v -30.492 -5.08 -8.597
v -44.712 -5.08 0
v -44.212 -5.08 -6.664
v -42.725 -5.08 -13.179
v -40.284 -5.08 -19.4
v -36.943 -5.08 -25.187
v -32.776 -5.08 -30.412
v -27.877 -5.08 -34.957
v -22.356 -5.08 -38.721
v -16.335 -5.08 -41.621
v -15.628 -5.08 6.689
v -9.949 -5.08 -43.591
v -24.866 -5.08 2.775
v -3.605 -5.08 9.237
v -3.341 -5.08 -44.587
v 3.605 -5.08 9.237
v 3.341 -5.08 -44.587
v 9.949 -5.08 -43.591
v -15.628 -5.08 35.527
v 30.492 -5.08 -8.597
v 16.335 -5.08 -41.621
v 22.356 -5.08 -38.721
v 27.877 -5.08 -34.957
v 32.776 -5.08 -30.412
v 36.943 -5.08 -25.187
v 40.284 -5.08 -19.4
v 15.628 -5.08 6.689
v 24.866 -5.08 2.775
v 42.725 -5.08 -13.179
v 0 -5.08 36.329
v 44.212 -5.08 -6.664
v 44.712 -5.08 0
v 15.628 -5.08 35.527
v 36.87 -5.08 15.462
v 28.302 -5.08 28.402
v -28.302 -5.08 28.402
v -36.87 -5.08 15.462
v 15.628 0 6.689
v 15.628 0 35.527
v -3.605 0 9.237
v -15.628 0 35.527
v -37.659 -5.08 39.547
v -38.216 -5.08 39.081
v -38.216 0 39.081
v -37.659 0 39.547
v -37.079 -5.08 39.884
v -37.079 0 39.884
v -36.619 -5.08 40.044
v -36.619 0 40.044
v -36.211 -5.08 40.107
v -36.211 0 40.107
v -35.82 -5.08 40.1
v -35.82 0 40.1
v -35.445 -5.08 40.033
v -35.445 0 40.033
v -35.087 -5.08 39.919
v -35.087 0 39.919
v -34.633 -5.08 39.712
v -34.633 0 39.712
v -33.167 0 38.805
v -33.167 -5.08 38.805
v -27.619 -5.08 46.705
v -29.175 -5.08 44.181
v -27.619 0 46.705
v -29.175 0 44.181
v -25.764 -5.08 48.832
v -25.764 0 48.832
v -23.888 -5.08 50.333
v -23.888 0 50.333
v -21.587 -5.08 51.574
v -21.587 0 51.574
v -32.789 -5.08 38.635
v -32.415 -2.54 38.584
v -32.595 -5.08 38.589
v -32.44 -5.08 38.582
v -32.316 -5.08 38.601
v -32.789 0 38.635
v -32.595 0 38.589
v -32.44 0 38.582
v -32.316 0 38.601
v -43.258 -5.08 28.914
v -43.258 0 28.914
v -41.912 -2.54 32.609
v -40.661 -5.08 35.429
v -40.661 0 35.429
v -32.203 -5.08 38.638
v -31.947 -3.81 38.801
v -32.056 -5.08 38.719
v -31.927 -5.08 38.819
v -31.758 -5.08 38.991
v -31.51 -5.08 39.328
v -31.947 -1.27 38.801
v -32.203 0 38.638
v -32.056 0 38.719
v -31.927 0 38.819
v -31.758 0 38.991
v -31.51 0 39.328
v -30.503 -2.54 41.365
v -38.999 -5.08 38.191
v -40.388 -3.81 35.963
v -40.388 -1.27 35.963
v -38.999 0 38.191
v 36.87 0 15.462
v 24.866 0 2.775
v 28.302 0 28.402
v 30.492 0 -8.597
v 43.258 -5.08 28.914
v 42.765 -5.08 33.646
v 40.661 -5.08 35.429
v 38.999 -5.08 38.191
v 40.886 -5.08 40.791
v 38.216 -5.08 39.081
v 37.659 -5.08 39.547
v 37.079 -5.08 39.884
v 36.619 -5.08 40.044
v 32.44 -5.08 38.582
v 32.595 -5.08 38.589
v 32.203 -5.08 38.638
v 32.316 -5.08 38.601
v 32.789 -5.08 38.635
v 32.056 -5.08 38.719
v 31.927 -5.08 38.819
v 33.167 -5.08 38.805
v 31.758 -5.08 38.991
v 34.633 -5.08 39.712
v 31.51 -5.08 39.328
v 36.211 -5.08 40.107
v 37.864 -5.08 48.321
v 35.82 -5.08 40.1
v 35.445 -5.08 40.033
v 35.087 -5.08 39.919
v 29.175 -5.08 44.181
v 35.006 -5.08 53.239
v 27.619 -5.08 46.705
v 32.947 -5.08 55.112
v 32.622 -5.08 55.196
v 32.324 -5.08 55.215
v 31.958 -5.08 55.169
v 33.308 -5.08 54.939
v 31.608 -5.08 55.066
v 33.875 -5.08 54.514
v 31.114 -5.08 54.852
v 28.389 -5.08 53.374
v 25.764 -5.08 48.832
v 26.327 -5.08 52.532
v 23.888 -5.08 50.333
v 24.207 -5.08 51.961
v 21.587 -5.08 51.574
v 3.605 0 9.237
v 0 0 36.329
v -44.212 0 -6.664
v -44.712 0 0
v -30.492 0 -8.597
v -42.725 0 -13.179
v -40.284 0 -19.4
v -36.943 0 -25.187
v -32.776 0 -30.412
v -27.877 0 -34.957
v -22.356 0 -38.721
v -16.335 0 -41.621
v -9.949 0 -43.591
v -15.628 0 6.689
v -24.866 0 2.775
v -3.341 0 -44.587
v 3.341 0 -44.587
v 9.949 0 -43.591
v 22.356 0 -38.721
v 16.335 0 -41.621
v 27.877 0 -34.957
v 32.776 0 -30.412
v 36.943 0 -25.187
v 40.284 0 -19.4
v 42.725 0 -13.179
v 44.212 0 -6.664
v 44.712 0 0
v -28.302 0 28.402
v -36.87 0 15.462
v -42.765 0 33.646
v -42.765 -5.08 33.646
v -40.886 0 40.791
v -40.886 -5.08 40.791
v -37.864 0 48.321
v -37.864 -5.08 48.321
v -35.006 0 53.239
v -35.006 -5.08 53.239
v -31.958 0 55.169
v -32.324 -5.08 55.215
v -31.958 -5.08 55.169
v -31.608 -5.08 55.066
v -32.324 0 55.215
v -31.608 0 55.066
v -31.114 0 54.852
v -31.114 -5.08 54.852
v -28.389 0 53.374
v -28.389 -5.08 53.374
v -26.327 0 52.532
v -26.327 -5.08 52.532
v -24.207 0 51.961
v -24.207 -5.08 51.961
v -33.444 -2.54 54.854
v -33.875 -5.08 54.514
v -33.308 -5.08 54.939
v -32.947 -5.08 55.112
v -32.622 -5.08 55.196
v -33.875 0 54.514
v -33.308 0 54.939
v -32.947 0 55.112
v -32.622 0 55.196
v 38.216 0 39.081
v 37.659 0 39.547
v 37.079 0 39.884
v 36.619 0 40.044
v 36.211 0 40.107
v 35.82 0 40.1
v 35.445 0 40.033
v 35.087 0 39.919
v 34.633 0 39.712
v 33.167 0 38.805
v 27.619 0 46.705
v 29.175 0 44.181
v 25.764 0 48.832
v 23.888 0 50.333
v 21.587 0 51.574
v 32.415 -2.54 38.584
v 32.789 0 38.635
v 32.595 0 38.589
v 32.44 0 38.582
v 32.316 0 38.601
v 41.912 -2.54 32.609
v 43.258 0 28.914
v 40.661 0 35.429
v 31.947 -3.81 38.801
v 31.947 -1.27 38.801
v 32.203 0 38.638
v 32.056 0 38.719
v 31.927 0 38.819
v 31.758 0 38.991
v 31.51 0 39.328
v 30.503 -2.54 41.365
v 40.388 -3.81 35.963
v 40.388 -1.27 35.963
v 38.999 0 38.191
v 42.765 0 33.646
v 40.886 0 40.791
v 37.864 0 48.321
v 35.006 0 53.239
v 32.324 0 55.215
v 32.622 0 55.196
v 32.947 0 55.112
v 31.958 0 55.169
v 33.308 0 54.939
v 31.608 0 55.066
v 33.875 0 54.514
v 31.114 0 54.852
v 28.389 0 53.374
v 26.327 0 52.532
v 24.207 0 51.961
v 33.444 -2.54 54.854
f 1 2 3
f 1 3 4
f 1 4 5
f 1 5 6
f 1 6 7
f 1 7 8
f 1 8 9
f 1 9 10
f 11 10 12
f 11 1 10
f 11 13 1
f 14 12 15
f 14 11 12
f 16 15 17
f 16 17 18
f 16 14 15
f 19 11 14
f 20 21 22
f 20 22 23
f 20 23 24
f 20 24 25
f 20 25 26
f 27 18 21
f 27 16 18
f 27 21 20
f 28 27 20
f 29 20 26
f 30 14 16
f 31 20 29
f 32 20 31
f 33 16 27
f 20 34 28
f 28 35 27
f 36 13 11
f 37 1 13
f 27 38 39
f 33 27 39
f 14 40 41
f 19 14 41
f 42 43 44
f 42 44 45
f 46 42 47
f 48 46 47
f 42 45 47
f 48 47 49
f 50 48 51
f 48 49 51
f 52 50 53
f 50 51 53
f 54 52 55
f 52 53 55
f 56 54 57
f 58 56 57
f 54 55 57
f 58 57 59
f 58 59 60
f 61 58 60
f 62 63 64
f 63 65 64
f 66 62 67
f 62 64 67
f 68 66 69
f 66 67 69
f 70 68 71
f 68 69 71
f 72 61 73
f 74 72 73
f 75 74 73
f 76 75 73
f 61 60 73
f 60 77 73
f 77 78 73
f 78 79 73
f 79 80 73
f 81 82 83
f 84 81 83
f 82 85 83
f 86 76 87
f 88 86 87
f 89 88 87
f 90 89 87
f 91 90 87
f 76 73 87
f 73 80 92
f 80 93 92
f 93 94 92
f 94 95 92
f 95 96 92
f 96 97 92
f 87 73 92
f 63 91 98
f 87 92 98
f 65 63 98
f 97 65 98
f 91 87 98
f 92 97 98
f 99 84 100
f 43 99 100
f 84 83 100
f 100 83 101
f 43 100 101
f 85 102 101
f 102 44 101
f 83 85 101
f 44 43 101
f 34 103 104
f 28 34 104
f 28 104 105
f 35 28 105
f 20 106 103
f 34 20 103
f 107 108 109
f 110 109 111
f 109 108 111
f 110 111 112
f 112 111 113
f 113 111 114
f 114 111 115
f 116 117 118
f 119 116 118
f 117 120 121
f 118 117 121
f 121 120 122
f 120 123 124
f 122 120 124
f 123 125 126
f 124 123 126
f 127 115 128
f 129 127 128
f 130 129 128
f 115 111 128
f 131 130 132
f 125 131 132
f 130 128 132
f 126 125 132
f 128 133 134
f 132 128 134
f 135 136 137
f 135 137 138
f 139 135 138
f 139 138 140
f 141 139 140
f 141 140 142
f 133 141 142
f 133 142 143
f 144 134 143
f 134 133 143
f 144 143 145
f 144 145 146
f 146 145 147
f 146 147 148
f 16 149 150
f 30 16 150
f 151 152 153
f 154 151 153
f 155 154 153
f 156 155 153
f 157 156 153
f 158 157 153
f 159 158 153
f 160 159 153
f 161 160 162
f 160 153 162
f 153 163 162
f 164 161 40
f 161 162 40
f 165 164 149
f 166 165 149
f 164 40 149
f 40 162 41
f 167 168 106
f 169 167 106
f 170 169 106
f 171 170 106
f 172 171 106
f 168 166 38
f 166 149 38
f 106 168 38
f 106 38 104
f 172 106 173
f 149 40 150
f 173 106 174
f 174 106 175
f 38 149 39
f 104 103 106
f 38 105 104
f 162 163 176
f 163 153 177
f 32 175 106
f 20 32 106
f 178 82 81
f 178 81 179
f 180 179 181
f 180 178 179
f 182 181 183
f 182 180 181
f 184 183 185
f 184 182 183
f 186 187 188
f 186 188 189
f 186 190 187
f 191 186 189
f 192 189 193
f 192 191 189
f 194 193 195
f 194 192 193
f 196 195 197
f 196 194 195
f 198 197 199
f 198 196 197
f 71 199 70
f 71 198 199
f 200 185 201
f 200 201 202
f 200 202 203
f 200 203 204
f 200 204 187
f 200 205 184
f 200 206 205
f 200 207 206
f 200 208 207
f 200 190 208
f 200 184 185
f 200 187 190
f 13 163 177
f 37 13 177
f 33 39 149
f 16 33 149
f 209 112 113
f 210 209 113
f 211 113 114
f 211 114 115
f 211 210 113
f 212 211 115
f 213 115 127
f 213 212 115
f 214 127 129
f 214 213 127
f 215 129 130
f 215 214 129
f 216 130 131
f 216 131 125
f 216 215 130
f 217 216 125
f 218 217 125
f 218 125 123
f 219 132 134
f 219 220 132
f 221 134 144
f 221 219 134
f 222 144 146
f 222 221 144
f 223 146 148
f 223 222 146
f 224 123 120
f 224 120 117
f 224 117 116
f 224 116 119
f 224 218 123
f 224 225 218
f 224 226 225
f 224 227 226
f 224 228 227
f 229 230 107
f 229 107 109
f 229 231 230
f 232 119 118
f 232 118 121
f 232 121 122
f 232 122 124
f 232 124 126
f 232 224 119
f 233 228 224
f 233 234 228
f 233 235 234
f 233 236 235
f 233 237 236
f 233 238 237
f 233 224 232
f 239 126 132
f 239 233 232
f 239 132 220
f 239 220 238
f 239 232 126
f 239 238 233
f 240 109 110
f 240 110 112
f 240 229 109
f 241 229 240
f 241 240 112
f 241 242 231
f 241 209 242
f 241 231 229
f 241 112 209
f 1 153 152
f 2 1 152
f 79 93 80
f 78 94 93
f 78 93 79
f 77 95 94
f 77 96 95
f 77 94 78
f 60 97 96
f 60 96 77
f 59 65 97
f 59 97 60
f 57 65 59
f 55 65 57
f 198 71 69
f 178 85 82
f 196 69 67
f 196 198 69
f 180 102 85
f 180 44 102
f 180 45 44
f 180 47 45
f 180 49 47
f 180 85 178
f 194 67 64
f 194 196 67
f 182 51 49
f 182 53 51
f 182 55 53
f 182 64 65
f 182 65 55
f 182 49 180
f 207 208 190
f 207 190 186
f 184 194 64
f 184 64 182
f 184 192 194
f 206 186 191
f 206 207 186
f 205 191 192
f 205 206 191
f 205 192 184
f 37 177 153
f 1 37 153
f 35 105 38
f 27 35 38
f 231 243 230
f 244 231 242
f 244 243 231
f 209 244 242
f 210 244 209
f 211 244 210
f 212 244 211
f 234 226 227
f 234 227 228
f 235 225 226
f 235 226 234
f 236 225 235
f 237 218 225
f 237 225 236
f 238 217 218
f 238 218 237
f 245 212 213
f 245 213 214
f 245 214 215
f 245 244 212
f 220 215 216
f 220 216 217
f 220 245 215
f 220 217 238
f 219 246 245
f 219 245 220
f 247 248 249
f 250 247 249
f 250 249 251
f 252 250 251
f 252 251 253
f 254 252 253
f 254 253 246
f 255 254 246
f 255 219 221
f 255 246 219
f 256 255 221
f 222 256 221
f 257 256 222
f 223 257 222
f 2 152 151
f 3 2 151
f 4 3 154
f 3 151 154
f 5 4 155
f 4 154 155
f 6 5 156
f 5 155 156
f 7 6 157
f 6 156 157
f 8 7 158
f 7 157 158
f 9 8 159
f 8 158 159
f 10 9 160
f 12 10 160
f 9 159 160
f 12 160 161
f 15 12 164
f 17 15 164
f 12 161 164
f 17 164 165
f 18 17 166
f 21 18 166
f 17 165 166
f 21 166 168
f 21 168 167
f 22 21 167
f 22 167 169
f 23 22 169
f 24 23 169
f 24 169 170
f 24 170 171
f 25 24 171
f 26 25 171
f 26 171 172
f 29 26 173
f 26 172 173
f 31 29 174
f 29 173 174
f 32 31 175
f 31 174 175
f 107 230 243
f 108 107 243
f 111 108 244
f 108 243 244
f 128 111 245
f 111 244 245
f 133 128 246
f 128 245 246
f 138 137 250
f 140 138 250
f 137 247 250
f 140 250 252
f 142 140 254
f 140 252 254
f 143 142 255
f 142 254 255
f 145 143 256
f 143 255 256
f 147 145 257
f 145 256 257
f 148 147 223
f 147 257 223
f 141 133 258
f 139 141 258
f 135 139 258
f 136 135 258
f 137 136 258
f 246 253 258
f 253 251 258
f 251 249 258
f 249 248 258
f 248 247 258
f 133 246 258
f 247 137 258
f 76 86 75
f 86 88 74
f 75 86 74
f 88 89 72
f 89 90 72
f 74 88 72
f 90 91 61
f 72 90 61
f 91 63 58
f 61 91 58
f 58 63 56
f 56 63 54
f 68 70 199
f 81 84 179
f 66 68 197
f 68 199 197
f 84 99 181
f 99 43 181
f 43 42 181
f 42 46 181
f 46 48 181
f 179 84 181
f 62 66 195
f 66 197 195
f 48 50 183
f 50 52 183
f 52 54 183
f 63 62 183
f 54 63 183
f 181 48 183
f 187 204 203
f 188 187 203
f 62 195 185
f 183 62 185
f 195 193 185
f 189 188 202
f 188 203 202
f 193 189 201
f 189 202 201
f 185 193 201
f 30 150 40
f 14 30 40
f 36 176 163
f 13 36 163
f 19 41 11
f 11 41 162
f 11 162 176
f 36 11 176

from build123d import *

# Parameters (mm, degrees)
F1_DEPTH = 5.08


with BuildPart() as f1:
    # F0 (on Front) → F1 (new body)
    with BuildSketch(Plane.XZ):
        with BuildLine():
            Line((-30.4917079704, -8.5969122879), (-44.7117361696, 0))
            ThreePointArc((-44.7117361696, 0), (0, -44.7117361696), (44.7117361696, 0))
            Line((44.7117361696, 0), (30.4917079704, -8.5969122879))
            Line((30.4917079704, -8.5969122879), (36.8702813996, 15.4620256321))
            Line((36.8702813996, 15.4620256321), (24.8657964922, 2.7749148631))
            Line((24.8657964922, 2.7749148631), (28.3017228247, 28.4015839336))
            Line((28.3017228247, 28.4015839336), (15.6278407007, 6.6893406487))
            Line((15.6278407007, 6.6893406487), (15.6278407007, 35.5272355899))
            Line((15.6278407007, 35.5272355899), (3.6053249558, 9.237256494))
            Line((3.6053249558, 9.237256494), (0, 36.3292721449))
            Line((0, 36.3292721449), (-3.6053249558, 9.237256494))
            Line((-3.6053249558, 9.237256494), (-15.6278407007, 35.5272355899))
            Line((-15.6278407007, 35.5272355899), (-15.6278407007, 6.6893406487))
            Line((-15.6278407007, 6.6893406487), (-28.3017228247, 28.4015839336))
            Line((-28.3017228247, 28.4015839336), (-24.8657964922, 2.7749148631))
            Line((-24.8657964922, 2.7749148631), (-36.8702813996, 15.4620256321))
            Line((-36.8702813996, 15.4620256321), (-30.4917079704, -8.5969122879))
        make_face()
    extrude(amount=F1_DEPTH)


with BuildPart() as f1b:
    # F0 (on Front) → F1, piece 2 (new body)
    with BuildSketch(Plane.XZ):
        with BuildLine():
            add(Edge.make_bspline(
                [(-43.2581901172, 28.9142417867), (-43.2581901172, 37.2790971041), (-32.8213132961, 62.5909789579), (-29.919565422, 52.343014737), (-21.5866644317, 51.5744184906)],
                knots=[0, 0, 0, 0, 0.6002335301, 1, 1, 1, 1], degree=3))
            add(Edge.make_bspline(
                [(-43.2581901172, 28.9142417867), (-37.5419406421, 45.9948715537), (-30.8065651402, 30.2143125781), (-29.919565422, 48.017363362), (-21.5866644317, 51.5744184906)],
                knots=[0, 0, 0, 0, 0.4810173452, 1, 1, 1, 1], degree=3))
        make_face()
    extrude(amount=F1_DEPTH)


with BuildPart() as f1c:
    # F0 (on Front) → F1, piece 3 (new body)
    with BuildSketch(Plane.XZ):
        with BuildLine():
            add(Edge.make_bspline(
                [(43.2581901172, 28.9142417867), (37.5419406421, 45.9948715537), (30.8065651402, 30.2143125781), (29.919565422, 48.017363362), (21.5866644317, 51.5744184906)],
                knots=[0, 0, 0, 0, 0.4810173452, 1, 1, 1, 1], degree=3))
            add(Edge.make_bspline(
                [(43.2581901172, 28.9142417867), (43.2581901172, 37.2790971041), (32.8213132961, 62.5909789579), (29.919565422, 52.343014737), (21.5866644317, 51.5744184906)],
                knots=[0, 0, 0, 0, 0.6002335301, 1, 1, 1, 1], degree=3))
        make_face()
    extrude(amount=F1_DEPTH)


solid = Compound([f1.part, f1b.part, f1c.part])
